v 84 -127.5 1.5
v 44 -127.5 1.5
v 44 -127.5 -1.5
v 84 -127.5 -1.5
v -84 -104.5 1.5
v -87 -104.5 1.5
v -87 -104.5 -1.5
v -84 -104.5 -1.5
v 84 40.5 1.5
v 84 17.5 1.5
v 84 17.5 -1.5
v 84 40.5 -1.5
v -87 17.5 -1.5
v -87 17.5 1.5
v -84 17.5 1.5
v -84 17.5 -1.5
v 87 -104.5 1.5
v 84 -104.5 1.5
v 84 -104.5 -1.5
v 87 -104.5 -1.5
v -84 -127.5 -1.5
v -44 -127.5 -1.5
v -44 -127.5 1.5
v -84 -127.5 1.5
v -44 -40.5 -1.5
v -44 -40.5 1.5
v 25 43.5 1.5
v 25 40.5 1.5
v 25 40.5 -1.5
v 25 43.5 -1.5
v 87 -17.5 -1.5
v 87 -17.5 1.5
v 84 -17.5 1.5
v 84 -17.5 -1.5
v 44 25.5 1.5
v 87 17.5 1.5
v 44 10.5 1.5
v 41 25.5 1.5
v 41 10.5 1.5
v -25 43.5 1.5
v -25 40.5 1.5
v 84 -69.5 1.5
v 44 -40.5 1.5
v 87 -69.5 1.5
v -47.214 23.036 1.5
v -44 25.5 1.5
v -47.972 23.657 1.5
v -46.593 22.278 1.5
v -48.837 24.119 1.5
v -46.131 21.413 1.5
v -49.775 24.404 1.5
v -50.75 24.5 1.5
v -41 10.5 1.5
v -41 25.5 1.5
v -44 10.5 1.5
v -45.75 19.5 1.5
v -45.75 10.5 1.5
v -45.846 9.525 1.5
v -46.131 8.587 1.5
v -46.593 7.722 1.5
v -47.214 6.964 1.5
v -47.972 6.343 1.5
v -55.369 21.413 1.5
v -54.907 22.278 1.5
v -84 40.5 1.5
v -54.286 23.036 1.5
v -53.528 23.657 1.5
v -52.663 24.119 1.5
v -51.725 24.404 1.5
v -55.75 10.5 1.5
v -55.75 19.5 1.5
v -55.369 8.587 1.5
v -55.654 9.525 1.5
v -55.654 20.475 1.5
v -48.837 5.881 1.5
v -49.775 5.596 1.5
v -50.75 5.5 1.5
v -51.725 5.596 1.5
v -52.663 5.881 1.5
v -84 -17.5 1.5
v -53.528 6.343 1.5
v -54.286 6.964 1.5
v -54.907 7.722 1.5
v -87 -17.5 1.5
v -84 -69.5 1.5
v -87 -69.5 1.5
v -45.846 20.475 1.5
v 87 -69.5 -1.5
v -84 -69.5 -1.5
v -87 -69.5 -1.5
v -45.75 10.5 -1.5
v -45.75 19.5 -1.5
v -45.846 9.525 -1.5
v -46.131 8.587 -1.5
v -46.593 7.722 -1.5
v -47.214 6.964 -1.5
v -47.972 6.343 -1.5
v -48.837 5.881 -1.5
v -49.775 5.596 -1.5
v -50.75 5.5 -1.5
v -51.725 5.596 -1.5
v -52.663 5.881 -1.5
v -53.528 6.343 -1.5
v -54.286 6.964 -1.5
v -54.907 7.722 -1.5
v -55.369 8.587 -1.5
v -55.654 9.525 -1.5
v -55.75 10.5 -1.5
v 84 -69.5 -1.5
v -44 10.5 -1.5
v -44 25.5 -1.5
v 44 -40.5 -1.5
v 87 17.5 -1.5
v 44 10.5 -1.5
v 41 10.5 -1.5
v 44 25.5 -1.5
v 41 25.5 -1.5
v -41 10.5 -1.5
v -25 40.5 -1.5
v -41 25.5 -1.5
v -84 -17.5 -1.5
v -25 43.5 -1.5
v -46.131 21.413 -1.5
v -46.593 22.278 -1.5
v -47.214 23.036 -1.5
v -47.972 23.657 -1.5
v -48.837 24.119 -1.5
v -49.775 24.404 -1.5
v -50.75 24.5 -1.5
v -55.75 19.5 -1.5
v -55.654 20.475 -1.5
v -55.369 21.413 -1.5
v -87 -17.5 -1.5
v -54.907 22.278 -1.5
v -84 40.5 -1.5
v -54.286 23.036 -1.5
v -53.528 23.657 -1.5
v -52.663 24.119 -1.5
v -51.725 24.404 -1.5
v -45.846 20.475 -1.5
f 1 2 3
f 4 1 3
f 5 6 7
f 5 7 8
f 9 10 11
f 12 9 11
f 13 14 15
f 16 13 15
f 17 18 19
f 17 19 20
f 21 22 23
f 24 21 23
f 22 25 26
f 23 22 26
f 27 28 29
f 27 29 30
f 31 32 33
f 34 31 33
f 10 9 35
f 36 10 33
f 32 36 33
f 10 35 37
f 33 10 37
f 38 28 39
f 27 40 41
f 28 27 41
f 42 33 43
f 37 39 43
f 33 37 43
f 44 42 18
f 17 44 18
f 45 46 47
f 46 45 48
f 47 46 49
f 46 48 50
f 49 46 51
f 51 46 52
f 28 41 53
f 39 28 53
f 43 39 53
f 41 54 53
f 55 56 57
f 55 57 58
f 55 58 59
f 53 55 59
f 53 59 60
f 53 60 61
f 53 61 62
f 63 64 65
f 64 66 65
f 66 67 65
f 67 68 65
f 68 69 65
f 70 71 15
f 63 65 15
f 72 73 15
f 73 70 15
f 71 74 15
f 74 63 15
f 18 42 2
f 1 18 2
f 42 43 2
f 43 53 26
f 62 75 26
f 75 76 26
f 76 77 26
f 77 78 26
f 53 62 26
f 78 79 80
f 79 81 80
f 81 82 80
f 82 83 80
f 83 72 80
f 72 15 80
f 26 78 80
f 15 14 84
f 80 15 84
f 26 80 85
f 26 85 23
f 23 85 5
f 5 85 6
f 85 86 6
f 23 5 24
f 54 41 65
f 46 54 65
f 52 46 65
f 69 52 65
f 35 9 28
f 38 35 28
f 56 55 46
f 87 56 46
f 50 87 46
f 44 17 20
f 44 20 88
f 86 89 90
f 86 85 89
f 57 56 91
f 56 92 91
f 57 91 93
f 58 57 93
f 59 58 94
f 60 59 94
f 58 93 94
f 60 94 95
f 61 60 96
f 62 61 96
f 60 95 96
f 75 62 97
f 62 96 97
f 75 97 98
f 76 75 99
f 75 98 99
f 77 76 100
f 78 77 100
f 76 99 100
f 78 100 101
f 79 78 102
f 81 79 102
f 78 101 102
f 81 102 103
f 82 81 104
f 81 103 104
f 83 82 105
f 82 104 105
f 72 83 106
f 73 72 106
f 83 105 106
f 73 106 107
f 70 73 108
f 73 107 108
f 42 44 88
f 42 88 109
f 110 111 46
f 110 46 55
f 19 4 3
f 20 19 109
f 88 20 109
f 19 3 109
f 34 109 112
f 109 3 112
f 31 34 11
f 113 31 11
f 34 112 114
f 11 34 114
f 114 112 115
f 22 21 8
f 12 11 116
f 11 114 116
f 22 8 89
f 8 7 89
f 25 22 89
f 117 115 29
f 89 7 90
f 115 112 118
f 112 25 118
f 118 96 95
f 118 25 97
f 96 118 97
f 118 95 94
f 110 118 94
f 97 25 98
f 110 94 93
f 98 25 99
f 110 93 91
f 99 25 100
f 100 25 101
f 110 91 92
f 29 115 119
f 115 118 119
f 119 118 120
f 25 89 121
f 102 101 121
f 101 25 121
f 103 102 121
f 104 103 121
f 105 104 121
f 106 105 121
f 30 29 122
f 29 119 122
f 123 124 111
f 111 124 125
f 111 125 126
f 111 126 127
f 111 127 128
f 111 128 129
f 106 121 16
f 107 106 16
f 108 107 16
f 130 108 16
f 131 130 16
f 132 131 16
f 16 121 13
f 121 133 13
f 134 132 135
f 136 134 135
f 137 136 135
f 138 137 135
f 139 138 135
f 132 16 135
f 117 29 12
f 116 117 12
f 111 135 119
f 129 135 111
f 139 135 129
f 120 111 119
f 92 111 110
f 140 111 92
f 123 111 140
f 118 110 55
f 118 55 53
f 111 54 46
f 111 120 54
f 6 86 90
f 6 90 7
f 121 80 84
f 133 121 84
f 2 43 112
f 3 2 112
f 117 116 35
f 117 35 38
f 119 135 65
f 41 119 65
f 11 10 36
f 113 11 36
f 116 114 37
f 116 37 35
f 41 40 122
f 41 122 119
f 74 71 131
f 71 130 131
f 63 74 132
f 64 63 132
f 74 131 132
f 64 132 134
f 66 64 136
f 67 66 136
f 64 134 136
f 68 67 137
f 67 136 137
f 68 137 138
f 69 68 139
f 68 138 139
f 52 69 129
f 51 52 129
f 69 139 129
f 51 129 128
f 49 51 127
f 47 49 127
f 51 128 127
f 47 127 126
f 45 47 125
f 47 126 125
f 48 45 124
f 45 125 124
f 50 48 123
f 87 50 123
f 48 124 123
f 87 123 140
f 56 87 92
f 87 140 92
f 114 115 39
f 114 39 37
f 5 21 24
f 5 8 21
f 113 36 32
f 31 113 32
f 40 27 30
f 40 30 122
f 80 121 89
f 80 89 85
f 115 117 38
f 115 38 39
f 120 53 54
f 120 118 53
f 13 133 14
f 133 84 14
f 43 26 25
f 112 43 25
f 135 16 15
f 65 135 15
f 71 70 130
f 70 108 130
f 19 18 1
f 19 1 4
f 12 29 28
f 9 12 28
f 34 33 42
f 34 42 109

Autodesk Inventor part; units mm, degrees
ref_plane "YZ Plane" through (0, 0, 0) normal (1, 0, 0) x (0, 1, 0)
ref_plane "XZ Plane" through (0, 0, 0) normal (0, 1, 0) x (-1, 0, 0)
ref_plane "XY Plane" through (0, 0, 0) normal (0, 0, 1) x (1, 0, 0)
sketch "Sketch1" plane through (0, 0, 0) normal (1, 0, 0) x (0, 1, 0)
  line L0 (-40.5, -1.5) -> (40.5, -1.5)
  line L1 (40.5, -1.5) -> (40.5, 1.5)
  line L2 (40.5, 1.5) -> (-40.5, 1.5)
  line L3 (-40.5, 1.5) -> (-40.5, -1.5)
  line L4 (-40.5, -1.5) -> (40.5, 1.5) construction
  line L5 (40.5, -1.5) -> (-40.5, 1.5) construction
  point P0 (0, 0)
  point P1 (0, 0)
  point P2 (0, 0)
  dimension "d27" = 3
  dimension "d28" = 81
extrude "Extrusion1" add sketch "Sketch1" along normal mid plane 88
sketch "Sketch2" plane through (44, 0, 0) normal (1, 0, 0) x (0, 0, -1)
  line L0 (1.5, 40.5) -> (-1.5, 40.5) projected
  line L1 (-1.5, 40.5) -> (-1.5, -40.5) projected
  line L2 (-1.5, -40.5) -> (1.5, -40.5) projected
  line L3 (1.5, -40.5) -> (1.5, 40.5) projected
  line L4 (1.5, 40.5) -> (-1.5, 40.5)
  line L5 (-1.5, 40.5) -> (-1.5, -127.5)
  line L6 (-1.5, -127.5) -> (1.5, -127.5)
  line L7 (1.5, -127.5) -> (1.5, 40.5)
  line L8 (-1.5, 40.5) -> (-1.5, -40.5) projected
  point P0 (0, 0)
  dimension "d29" = 168
extrude "Extrusion2" add sketch "Sketch2" along normal blind 40
sketch "Sketch3" plane through (44, -35, 1.5) normal (0, 0, 1) x (1, 0, 0)
  line L0 (-44, 35) -> (111.2969, 35) construction
  line L1 (43, 17.5) -> (40, 17.5)
  line L2 (40, 17.5) -> (40, 52.5)
  line L3 (40, 52.5) -> (43, 52.5)
  line L4 (43, 52.5) -> (43, 17.5)
  line L5 (43, 17.5) -> (40, 52.5) construction
  line L6 (40, 17.5) -> (43, 52.5) construction
  line L7 (40, 75.5) -> (40, -92.5) projected
  line L8 (0, -5.5) -> (0, -92.5) projected
  line L9 (0, -92.5) -> (40, -92.5) projected
  line L10 (40, -92.5) -> (40, 75.5) projected
  line L11 (40, -8.5) -> (0, -8.5) construction
  line L12 (43, -34.5) -> (40, -34.5)
  line L13 (40, -34.5) -> (40, -69.5)
  line L14 (40, -69.5) -> (43, -69.5)
  line L15 (43, -69.5) -> (43, -34.5)
  line L16 (43, -34.5) -> (40, -69.5) construction
  line L17 (40, -34.5) -> (43, -69.5) construction
  point P0 (41.5, 35)
  point P1 (41.5, -52)
  point P2 (40, -34.5)
  point P3 (40, -69.5)
  dimension "d23" = 3
  dimension "d24" = 35
extrude "Extrusion3" add sketch "Sketch3" against normal up to surface (3 mm away)
mirror "Mirror1" about plane through (0, 0, 0) normal (1, 0, 0) of "Extrusion2", "Extrusion3"
sketch "Sketch4" plane through (84, -127.5, -1.5) normal (0, 0, -1) x (-1, 0, 0)
  line L0 (40, 153) -> (43, 153)
  line L1 (43, 153) -> (43, 138)
  line L2 (43, 138) -> (40, 138)
  line L3 (40, 138) -> (40, 153)
  line L4 (40, 20) -> (43, 20)
  line L5 (43, 55) -> (43, 20)
  line L6 (43, 82.6608) -> (43, 55)
  line L7 (40, 82.6608) -> (43, 82.6608)
  line L8 (40, 55) -> (40, 82.6608)
  line L9 (43, 55) -> (40, 55)
  line L10 (40, 20) -> (40, 55)
  line L11 (40, -14.5469) -> (40, 20)
  line L12 (43, -14.5469) -> (40, -14.5469)
  line L13 (43, 20) -> (43, -14.5469)
  line L14 (125, 153) -> (128, 153)
  line L15 (128, 153) -> (128, 138)
  line L16 (128, 138) -> (125, 138)
  line L17 (125, 138) -> (125, 153)
  line L18 (125, 20) -> (128, 20)
  line L19 (128, 55) -> (128, 20)
  line L20 (128, 82.6608) -> (128, 55)
  line L21 (125, 82.6608) -> (128, 82.6608)
  line L22 (125, 55) -> (125, 82.6608)
  line L23 (128, 55) -> (125, 55)
  line L24 (125, 20) -> (125, 55)
  line L25 (125, -14.5469) -> (125, 20)
  line L26 (128, -14.5469) -> (125, -14.5469)
  line L27 (128, 20) -> (128, -14.5469)
  point P0 (84, 127.5)
extrude "Extrusion4" cut sketch "Sketch4" against normal blind 10 contours L0 L1 L2 L3 | L14 L15 L16 L17
sketch "Sketch5" plane through (44, -127.5, -1.5) normal (0, 0, -1) x (-1, 0, 0)
  line L0 (99.9, 138) -> (99.9, 147)
  line L1 (89.6, 147) -> (89.6, 138)
  line L2 (89.6, 138) -> (99.9, 138)
  line L3 (94.75, 147) -> (94.75, 138) construction
  line L4 (89.75, 147) -> (89.75, 138)
  line L5 (99.75, 138) -> (99.75, 147)
  arc A0 (99.75, 147) -> (89.75, 147) centre (94.75, 147) ccw
  arc A1 (89.75, 138) -> (99.75, 138) centre (94.75, 138) ccw
  point P0 (44, 127.5)
  point P1 (94.75, 142.5)
  dimension "d35" = 10
  dimension "d36" = 9
  dimension "d37" = 0.15
  dimension "d38" = 55.9
  dimension "d39" = 10.5
  dimension "d40" = 9
  dimension "d41" = 9
extrude "Extrusion5" cut sketch "Sketch5" against normal blind 10
sketch "Sketch6" plane through (44, -127.5, 1.5) normal (0, 0, 1) x (1, 0, 0)
  line L0 (-69, 165) -> (-19, 165)
  line L1 (-19, 165) -> (-19, 171)
  line L2 (-19, 171) -> (-69, 171)
  line L3 (-69, 171) -> (-69, 165)
  line L4 (40, 168) -> (-128, 168) projected
  line L5 (-69, 165) -> (-19, 171) construction
  line L6 (-19, 165) -> (-69, 171) construction
  point P0 (-44, 127.5)
  point P1 (-44, 168)
  point P2 (-69, 168)
  point P3 (-19, 168)
  dimension "d44" = 50
  dimension "d45" = 6
extrude "Extrusion6" add sketch "Sketch6" against normal up to surface (3 mm away) contours L3 L2 L1 L4
properties part number "Suelo"
